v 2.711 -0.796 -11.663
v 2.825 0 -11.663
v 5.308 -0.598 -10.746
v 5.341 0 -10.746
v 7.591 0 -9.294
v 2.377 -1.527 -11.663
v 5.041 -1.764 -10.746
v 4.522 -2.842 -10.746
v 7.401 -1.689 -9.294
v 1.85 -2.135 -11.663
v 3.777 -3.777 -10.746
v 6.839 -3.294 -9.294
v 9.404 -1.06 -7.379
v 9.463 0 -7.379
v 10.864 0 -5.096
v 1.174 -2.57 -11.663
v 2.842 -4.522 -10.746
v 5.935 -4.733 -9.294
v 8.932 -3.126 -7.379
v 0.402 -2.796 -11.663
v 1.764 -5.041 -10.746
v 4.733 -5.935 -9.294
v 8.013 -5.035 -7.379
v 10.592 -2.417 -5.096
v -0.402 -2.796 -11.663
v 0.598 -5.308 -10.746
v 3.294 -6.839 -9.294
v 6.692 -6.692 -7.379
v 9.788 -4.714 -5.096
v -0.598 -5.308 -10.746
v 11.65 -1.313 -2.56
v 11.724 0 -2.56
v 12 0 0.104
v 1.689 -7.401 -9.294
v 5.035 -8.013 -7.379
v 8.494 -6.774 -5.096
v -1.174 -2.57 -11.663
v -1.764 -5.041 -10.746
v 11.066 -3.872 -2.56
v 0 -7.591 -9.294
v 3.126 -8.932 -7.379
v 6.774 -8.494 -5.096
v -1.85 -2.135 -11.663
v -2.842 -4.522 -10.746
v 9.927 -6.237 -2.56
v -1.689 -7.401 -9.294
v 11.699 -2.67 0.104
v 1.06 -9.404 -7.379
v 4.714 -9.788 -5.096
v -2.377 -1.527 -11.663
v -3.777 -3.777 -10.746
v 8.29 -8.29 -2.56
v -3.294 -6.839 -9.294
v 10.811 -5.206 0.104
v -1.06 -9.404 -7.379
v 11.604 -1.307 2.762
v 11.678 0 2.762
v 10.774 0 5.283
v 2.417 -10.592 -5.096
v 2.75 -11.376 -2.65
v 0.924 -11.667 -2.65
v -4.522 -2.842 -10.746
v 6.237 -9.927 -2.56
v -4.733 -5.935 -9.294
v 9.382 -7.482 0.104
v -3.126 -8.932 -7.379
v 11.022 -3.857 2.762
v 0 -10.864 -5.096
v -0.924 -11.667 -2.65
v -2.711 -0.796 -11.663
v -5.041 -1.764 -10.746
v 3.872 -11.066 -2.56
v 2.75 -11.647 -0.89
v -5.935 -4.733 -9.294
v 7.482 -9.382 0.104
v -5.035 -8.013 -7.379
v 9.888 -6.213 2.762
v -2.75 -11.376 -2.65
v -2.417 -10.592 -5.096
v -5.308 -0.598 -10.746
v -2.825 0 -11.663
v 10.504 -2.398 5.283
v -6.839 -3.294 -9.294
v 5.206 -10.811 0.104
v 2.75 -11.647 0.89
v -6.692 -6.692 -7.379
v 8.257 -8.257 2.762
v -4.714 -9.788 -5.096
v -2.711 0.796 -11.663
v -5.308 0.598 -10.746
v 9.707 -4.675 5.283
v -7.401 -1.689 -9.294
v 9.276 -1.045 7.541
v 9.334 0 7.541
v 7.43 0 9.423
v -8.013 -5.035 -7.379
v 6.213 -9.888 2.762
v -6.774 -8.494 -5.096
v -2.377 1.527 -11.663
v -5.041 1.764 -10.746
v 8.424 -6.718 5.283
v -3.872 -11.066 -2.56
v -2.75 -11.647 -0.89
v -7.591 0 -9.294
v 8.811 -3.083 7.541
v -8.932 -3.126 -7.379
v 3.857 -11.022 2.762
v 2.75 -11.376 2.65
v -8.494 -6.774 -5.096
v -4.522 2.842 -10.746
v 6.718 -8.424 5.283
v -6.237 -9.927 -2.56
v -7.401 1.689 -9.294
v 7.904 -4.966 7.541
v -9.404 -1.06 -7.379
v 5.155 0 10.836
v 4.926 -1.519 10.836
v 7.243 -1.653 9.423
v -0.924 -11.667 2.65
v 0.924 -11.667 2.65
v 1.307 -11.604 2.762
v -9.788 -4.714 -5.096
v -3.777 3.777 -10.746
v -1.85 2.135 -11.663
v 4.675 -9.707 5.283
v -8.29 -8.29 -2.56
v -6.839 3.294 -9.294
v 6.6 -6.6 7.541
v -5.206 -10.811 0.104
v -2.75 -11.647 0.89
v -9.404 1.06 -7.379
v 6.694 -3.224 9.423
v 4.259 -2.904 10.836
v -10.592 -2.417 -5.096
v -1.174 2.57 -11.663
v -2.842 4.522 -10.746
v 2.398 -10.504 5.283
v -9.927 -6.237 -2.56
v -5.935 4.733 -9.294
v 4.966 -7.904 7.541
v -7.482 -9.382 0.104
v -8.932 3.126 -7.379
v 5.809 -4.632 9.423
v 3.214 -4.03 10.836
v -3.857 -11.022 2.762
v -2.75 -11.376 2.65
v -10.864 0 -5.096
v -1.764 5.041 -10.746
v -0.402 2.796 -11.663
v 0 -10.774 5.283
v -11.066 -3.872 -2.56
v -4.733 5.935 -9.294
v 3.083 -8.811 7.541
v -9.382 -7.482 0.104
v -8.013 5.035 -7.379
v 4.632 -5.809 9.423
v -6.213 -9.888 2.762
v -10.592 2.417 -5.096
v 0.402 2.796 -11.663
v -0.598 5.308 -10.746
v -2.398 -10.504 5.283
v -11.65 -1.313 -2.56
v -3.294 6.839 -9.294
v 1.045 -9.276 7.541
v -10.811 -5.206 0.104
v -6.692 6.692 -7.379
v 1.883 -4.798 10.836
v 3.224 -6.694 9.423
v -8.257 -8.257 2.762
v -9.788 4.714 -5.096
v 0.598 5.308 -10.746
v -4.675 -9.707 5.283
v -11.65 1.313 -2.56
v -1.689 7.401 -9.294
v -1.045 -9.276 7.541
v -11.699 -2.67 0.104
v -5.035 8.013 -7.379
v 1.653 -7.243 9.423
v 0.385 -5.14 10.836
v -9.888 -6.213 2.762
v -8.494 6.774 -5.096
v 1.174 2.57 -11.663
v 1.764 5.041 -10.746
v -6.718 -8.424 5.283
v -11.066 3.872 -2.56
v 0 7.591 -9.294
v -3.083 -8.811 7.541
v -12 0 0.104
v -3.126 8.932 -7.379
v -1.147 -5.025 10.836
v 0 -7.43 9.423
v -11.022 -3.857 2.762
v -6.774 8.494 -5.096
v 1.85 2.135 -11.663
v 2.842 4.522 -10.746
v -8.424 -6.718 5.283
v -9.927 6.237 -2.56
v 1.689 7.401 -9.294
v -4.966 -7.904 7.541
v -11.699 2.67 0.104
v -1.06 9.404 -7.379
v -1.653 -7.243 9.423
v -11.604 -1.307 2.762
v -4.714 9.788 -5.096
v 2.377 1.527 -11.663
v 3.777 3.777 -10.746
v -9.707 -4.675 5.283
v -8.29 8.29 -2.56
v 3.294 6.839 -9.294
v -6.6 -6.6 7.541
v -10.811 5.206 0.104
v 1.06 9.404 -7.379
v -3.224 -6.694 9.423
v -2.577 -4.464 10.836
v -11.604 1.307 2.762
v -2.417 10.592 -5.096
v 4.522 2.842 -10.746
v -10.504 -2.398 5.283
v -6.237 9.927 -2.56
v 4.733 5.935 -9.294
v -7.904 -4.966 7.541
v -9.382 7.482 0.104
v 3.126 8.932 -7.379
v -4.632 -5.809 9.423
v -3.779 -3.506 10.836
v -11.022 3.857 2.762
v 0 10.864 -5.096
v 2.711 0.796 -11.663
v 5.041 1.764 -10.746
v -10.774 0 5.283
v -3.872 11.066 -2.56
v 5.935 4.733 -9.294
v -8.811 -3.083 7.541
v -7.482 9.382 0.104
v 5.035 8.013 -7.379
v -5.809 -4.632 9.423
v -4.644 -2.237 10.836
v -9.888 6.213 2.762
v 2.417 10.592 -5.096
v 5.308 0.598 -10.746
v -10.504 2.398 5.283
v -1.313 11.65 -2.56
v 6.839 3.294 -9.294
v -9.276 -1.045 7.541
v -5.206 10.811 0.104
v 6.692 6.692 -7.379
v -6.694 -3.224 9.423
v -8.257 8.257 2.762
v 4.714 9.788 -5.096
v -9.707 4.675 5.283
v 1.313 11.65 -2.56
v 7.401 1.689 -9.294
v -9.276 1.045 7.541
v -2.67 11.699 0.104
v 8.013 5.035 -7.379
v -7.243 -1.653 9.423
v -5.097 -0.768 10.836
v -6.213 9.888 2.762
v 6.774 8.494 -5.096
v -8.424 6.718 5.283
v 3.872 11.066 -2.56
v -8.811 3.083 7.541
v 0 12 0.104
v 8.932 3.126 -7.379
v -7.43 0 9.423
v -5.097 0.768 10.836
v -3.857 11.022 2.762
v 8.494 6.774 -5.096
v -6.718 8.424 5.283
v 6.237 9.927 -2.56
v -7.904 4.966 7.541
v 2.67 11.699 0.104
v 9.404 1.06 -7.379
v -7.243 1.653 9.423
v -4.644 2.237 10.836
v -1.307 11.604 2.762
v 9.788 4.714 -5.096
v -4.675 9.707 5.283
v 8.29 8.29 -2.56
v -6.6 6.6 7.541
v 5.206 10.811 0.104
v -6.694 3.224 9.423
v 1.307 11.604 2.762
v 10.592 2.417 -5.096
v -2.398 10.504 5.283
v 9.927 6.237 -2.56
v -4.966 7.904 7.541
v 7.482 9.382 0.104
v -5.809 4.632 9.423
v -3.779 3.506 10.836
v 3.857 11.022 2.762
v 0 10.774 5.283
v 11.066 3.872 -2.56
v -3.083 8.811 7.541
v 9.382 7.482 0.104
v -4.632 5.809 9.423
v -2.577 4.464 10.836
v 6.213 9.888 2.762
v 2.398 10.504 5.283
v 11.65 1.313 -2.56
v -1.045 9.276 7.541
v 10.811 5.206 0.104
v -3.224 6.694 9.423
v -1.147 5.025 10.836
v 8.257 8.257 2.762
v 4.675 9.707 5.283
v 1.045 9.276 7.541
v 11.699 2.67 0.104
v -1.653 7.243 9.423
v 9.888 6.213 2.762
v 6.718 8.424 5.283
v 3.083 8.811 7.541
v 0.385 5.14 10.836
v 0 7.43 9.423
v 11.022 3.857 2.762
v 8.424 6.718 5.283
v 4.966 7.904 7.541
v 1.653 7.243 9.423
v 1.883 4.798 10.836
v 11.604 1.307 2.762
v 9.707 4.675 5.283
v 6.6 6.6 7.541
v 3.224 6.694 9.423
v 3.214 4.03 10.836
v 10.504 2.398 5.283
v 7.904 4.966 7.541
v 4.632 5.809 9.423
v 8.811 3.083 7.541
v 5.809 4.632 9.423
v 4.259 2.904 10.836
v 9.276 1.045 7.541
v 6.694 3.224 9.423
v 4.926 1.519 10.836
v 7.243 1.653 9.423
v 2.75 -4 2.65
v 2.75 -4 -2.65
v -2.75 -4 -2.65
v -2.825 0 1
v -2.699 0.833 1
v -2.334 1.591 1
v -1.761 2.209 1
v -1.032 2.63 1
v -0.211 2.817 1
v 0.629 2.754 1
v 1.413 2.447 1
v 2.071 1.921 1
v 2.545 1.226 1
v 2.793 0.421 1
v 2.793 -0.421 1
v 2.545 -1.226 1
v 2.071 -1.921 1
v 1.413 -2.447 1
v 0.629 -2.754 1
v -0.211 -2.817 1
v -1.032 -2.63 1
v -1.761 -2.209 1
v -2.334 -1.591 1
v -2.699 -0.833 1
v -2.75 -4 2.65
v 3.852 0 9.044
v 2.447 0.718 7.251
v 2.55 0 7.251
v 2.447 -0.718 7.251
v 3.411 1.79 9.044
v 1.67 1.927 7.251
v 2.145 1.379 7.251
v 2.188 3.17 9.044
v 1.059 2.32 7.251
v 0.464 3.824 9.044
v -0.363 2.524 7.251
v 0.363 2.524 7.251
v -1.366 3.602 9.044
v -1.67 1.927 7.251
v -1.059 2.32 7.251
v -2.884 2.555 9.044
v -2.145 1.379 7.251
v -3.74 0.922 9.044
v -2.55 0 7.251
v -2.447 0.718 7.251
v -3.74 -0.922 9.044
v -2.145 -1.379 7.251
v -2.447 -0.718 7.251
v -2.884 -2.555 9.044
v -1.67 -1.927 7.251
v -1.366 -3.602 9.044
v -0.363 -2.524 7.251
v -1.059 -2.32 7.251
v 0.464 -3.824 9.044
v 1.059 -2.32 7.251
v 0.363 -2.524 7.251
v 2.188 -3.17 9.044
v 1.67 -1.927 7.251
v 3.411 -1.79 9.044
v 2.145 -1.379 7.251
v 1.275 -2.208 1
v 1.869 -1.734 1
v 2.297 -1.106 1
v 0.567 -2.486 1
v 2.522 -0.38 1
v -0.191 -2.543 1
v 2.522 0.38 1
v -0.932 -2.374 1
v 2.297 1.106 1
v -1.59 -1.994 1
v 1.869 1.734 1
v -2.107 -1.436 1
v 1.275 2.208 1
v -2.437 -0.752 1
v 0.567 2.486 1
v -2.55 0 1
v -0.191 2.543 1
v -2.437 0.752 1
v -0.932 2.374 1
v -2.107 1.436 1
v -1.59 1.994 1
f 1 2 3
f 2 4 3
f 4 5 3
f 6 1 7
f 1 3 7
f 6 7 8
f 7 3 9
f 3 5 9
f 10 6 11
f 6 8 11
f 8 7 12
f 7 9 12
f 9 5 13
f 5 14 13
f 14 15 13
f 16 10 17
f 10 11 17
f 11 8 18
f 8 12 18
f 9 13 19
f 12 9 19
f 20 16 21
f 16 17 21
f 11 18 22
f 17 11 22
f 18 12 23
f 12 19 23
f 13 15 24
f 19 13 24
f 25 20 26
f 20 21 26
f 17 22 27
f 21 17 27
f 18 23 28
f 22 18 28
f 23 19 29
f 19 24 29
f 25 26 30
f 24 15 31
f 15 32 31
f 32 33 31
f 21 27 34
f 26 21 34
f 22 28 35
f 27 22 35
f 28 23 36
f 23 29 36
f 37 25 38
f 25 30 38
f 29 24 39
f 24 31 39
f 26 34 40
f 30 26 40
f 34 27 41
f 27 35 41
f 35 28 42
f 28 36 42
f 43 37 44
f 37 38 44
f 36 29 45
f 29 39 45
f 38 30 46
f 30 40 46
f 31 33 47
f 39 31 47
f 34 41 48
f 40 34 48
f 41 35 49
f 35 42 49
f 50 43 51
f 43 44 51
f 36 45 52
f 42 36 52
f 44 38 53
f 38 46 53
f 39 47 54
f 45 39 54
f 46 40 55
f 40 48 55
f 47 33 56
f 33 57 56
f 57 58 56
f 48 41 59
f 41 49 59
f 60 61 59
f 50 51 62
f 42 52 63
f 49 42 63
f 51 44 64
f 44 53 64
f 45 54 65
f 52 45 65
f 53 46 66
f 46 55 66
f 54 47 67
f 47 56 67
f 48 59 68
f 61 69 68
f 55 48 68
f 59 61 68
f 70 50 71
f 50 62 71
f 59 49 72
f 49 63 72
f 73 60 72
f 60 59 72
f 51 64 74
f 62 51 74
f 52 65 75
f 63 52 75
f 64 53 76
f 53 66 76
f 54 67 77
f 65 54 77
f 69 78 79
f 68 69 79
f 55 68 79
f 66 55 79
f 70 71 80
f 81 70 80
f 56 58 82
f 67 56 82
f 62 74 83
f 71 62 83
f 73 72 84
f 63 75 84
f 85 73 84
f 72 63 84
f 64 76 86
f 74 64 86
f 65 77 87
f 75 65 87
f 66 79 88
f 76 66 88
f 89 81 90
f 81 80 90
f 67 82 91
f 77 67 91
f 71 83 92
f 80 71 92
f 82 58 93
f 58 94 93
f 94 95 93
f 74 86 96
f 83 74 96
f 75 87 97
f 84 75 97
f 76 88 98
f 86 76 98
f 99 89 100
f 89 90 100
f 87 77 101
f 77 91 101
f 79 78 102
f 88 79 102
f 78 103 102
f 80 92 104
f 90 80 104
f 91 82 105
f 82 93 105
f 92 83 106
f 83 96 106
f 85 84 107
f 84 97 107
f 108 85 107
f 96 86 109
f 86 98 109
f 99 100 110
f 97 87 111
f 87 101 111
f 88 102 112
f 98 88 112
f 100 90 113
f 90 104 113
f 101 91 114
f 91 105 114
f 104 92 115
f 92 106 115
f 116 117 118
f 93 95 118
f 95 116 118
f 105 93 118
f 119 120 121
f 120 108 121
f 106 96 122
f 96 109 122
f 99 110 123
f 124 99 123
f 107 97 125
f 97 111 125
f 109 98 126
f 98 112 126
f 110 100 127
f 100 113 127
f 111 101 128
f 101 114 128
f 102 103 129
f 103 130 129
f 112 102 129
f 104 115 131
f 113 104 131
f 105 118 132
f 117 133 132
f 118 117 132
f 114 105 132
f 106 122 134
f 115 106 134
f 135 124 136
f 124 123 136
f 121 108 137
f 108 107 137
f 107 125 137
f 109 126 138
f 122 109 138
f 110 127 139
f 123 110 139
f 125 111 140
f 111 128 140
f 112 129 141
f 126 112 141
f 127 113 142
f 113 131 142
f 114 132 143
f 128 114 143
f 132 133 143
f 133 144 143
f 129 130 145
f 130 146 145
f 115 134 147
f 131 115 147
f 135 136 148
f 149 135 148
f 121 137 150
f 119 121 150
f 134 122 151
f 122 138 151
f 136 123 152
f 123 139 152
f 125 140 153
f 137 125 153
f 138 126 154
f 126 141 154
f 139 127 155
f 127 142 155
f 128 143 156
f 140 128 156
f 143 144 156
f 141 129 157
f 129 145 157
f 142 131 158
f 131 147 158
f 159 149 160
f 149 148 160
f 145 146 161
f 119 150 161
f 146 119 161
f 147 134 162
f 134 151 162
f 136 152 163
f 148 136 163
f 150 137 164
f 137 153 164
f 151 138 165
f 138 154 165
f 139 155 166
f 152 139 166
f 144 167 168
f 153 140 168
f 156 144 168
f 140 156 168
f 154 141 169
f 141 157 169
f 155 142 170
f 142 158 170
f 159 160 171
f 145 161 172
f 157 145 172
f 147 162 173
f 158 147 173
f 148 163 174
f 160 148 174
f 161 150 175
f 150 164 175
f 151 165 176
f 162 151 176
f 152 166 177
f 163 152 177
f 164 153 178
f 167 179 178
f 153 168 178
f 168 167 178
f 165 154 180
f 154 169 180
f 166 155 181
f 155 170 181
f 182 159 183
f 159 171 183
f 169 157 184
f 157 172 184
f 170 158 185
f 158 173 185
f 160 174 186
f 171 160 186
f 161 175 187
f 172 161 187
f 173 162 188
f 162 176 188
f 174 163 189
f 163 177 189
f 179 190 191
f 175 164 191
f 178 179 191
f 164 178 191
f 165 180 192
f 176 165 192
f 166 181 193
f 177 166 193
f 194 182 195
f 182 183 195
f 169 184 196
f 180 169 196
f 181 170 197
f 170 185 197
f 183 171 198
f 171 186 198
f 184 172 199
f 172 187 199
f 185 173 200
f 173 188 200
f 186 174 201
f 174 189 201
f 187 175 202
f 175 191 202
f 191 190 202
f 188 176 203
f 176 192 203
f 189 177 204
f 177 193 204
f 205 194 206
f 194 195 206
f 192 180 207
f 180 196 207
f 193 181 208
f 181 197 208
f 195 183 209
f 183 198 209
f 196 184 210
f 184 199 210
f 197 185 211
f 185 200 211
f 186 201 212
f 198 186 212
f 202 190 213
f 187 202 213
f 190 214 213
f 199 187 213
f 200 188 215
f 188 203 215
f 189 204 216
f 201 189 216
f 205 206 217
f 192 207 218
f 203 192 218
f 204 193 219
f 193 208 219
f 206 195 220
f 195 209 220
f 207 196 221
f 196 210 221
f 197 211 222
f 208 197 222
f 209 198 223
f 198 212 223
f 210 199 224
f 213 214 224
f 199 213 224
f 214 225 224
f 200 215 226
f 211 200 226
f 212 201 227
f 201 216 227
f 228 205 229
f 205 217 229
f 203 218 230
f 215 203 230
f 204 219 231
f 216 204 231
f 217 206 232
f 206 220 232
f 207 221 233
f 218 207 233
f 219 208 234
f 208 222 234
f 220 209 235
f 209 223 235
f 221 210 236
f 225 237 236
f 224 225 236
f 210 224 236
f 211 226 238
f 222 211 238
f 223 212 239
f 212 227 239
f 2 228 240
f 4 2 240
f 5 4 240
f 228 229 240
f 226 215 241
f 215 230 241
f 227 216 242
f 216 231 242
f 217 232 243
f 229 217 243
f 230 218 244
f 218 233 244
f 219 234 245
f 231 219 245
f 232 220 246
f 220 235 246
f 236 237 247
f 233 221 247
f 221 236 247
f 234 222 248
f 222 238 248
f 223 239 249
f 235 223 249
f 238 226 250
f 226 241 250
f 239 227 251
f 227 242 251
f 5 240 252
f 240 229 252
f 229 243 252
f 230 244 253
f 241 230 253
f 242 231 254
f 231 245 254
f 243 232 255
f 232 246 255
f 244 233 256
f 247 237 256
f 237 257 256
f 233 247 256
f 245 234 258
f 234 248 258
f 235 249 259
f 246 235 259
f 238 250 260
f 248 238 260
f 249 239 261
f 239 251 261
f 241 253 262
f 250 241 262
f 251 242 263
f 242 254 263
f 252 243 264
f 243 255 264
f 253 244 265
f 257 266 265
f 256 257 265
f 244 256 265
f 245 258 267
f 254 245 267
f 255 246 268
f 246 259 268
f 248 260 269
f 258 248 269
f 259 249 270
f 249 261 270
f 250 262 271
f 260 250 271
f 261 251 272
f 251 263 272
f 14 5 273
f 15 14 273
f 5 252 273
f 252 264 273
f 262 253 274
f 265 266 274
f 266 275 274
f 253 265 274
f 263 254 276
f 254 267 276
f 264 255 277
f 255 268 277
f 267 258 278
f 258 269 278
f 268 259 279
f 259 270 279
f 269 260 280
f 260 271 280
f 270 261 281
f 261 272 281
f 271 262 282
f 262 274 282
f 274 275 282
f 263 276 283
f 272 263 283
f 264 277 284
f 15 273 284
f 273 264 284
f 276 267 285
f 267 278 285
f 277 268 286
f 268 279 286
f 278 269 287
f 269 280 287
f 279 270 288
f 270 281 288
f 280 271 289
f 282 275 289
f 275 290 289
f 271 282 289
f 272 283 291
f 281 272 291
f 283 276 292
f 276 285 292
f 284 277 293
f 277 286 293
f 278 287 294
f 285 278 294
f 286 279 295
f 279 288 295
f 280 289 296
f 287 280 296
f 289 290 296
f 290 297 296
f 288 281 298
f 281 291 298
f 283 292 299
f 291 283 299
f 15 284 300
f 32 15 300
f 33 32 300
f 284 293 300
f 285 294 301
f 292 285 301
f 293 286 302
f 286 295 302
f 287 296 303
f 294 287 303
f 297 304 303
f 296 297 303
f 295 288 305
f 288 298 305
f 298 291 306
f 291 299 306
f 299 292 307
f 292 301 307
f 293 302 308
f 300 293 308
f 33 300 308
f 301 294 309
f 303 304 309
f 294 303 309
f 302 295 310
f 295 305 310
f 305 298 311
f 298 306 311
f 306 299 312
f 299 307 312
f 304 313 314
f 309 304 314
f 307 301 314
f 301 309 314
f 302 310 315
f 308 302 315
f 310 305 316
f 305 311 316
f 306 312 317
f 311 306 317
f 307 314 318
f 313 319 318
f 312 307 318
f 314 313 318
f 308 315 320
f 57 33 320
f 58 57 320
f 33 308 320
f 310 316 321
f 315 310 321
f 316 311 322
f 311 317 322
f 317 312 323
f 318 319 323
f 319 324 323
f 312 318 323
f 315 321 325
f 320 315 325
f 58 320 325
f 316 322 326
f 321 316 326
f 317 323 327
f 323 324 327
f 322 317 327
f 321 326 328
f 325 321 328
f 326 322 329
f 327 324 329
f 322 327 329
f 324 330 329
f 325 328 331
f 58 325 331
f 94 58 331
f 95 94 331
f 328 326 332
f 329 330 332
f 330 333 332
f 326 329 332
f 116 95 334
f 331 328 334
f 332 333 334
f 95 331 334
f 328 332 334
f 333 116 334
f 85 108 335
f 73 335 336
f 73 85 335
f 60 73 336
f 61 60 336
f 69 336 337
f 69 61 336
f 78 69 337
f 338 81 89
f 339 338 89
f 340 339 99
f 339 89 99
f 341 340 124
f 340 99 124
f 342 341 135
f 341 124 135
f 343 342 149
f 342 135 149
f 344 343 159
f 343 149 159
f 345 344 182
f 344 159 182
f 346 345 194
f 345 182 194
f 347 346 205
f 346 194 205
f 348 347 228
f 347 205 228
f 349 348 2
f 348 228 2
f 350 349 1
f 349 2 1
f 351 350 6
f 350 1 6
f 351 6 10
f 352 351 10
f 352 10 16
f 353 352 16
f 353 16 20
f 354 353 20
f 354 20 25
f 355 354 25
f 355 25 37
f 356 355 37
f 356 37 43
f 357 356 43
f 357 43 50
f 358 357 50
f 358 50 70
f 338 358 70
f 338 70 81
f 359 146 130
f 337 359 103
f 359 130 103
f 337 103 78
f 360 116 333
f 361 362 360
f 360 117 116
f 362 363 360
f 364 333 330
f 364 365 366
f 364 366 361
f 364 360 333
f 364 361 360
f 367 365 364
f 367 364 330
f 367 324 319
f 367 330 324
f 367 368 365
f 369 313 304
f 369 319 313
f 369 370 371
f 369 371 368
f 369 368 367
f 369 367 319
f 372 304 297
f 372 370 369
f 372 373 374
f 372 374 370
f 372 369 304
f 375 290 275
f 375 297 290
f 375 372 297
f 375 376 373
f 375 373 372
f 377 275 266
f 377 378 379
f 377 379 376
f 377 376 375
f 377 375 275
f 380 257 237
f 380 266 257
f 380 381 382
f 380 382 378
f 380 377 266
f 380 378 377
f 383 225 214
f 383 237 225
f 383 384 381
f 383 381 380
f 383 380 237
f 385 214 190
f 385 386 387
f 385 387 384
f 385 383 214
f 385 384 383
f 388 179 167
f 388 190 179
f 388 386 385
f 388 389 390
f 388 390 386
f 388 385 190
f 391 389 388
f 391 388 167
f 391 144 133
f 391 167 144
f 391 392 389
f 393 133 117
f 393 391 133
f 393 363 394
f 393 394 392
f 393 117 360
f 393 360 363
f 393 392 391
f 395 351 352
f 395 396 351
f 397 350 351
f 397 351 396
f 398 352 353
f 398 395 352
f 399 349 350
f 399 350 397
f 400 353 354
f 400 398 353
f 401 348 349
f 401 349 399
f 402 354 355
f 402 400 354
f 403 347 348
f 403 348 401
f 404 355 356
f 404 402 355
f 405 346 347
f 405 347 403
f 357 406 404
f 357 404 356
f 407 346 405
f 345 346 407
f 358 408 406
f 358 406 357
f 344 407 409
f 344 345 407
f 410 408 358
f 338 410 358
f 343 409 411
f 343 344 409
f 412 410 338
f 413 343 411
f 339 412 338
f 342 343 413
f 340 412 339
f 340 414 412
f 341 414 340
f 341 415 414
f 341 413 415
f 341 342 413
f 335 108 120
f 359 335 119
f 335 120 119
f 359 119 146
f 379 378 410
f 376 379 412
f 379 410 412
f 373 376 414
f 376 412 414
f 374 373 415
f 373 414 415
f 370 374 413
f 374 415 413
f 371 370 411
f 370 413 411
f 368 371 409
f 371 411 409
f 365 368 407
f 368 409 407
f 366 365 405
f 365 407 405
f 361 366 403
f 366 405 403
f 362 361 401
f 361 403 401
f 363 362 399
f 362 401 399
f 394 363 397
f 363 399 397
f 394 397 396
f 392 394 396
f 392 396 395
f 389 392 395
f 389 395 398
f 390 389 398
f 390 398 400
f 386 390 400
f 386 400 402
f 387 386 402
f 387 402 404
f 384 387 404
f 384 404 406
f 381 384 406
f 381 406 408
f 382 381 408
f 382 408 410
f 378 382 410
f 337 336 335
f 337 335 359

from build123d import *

# Parameters (mm, degrees)
SKETCH2_R          = 6
CONE_DEPTH         = 8
CONE_TAPER         = 36
SKETCH5_R          = 2.825
CUT_EXTRUDE3_DEPTH = 13
SKETCH4_W          = 5.5
SKETCH4_H          = 5.3
CUT_EXTRUDE2_DEPTH = 8
SKETCH6_R          = 2.55
CUT_EXTRUDE4_DEPTH = 10


with BuildPart() as part:
    # Sketch1 → Revolve1 (revolve)
    with BuildSketch(Plane(origin=(0, 0, 0), x_dir=(1, 0, 0), z_dir=(0, 1, 0))):
        with BuildLine():
            Line((0, -12), (0, 12))
            ThreePointArc((0, 12), (12, 0), (0, -12))
        make_face()
    revolve(axis=Axis((0, 0, 12), (0, 0, -1)))

    # Sketch2 → Cone (cut)
    with BuildSketch(Plane.XY.offset(12)):
        Circle(SKETCH2_R)
    extrude(amount=-CONE_DEPTH, taper=CONE_TAPER, mode=Mode.SUBTRACT)

    # Sketch5 → Cut-Extrude3 (cut)
    with BuildSketch(Plane(origin=(0, 0, -12), x_dir=(-1, 0, 0), z_dir=(0, 0, -1))):
        Circle(SKETCH5_R)
    extrude(amount=-CUT_EXTRUDE3_DEPTH, mode=Mode.SUBTRACT)

    # Sketch4 → Cut-Extrude2 (cut)
    with BuildSketch(Plane(origin=(0, -12, 0), x_dir=(-1, 0, 0), z_dir=(0, -1, 0))):
        Rectangle(SKETCH4_W, SKETCH4_H)
    extrude(amount=-CUT_EXTRUDE2_DEPTH, mode=Mode.SUBTRACT)

    # Sketch6 → Cut-Extrude4 (cut)
    with BuildSketch(Plane(origin=(0, 0, 1), x_dir=(-1, 0, 0), z_dir=(0, 0, -1))):
        Circle(SKETCH6_R)
    extrude(amount=-CUT_EXTRUDE4_DEPTH, mode=Mode.SUBTRACT)


solid = part.part
